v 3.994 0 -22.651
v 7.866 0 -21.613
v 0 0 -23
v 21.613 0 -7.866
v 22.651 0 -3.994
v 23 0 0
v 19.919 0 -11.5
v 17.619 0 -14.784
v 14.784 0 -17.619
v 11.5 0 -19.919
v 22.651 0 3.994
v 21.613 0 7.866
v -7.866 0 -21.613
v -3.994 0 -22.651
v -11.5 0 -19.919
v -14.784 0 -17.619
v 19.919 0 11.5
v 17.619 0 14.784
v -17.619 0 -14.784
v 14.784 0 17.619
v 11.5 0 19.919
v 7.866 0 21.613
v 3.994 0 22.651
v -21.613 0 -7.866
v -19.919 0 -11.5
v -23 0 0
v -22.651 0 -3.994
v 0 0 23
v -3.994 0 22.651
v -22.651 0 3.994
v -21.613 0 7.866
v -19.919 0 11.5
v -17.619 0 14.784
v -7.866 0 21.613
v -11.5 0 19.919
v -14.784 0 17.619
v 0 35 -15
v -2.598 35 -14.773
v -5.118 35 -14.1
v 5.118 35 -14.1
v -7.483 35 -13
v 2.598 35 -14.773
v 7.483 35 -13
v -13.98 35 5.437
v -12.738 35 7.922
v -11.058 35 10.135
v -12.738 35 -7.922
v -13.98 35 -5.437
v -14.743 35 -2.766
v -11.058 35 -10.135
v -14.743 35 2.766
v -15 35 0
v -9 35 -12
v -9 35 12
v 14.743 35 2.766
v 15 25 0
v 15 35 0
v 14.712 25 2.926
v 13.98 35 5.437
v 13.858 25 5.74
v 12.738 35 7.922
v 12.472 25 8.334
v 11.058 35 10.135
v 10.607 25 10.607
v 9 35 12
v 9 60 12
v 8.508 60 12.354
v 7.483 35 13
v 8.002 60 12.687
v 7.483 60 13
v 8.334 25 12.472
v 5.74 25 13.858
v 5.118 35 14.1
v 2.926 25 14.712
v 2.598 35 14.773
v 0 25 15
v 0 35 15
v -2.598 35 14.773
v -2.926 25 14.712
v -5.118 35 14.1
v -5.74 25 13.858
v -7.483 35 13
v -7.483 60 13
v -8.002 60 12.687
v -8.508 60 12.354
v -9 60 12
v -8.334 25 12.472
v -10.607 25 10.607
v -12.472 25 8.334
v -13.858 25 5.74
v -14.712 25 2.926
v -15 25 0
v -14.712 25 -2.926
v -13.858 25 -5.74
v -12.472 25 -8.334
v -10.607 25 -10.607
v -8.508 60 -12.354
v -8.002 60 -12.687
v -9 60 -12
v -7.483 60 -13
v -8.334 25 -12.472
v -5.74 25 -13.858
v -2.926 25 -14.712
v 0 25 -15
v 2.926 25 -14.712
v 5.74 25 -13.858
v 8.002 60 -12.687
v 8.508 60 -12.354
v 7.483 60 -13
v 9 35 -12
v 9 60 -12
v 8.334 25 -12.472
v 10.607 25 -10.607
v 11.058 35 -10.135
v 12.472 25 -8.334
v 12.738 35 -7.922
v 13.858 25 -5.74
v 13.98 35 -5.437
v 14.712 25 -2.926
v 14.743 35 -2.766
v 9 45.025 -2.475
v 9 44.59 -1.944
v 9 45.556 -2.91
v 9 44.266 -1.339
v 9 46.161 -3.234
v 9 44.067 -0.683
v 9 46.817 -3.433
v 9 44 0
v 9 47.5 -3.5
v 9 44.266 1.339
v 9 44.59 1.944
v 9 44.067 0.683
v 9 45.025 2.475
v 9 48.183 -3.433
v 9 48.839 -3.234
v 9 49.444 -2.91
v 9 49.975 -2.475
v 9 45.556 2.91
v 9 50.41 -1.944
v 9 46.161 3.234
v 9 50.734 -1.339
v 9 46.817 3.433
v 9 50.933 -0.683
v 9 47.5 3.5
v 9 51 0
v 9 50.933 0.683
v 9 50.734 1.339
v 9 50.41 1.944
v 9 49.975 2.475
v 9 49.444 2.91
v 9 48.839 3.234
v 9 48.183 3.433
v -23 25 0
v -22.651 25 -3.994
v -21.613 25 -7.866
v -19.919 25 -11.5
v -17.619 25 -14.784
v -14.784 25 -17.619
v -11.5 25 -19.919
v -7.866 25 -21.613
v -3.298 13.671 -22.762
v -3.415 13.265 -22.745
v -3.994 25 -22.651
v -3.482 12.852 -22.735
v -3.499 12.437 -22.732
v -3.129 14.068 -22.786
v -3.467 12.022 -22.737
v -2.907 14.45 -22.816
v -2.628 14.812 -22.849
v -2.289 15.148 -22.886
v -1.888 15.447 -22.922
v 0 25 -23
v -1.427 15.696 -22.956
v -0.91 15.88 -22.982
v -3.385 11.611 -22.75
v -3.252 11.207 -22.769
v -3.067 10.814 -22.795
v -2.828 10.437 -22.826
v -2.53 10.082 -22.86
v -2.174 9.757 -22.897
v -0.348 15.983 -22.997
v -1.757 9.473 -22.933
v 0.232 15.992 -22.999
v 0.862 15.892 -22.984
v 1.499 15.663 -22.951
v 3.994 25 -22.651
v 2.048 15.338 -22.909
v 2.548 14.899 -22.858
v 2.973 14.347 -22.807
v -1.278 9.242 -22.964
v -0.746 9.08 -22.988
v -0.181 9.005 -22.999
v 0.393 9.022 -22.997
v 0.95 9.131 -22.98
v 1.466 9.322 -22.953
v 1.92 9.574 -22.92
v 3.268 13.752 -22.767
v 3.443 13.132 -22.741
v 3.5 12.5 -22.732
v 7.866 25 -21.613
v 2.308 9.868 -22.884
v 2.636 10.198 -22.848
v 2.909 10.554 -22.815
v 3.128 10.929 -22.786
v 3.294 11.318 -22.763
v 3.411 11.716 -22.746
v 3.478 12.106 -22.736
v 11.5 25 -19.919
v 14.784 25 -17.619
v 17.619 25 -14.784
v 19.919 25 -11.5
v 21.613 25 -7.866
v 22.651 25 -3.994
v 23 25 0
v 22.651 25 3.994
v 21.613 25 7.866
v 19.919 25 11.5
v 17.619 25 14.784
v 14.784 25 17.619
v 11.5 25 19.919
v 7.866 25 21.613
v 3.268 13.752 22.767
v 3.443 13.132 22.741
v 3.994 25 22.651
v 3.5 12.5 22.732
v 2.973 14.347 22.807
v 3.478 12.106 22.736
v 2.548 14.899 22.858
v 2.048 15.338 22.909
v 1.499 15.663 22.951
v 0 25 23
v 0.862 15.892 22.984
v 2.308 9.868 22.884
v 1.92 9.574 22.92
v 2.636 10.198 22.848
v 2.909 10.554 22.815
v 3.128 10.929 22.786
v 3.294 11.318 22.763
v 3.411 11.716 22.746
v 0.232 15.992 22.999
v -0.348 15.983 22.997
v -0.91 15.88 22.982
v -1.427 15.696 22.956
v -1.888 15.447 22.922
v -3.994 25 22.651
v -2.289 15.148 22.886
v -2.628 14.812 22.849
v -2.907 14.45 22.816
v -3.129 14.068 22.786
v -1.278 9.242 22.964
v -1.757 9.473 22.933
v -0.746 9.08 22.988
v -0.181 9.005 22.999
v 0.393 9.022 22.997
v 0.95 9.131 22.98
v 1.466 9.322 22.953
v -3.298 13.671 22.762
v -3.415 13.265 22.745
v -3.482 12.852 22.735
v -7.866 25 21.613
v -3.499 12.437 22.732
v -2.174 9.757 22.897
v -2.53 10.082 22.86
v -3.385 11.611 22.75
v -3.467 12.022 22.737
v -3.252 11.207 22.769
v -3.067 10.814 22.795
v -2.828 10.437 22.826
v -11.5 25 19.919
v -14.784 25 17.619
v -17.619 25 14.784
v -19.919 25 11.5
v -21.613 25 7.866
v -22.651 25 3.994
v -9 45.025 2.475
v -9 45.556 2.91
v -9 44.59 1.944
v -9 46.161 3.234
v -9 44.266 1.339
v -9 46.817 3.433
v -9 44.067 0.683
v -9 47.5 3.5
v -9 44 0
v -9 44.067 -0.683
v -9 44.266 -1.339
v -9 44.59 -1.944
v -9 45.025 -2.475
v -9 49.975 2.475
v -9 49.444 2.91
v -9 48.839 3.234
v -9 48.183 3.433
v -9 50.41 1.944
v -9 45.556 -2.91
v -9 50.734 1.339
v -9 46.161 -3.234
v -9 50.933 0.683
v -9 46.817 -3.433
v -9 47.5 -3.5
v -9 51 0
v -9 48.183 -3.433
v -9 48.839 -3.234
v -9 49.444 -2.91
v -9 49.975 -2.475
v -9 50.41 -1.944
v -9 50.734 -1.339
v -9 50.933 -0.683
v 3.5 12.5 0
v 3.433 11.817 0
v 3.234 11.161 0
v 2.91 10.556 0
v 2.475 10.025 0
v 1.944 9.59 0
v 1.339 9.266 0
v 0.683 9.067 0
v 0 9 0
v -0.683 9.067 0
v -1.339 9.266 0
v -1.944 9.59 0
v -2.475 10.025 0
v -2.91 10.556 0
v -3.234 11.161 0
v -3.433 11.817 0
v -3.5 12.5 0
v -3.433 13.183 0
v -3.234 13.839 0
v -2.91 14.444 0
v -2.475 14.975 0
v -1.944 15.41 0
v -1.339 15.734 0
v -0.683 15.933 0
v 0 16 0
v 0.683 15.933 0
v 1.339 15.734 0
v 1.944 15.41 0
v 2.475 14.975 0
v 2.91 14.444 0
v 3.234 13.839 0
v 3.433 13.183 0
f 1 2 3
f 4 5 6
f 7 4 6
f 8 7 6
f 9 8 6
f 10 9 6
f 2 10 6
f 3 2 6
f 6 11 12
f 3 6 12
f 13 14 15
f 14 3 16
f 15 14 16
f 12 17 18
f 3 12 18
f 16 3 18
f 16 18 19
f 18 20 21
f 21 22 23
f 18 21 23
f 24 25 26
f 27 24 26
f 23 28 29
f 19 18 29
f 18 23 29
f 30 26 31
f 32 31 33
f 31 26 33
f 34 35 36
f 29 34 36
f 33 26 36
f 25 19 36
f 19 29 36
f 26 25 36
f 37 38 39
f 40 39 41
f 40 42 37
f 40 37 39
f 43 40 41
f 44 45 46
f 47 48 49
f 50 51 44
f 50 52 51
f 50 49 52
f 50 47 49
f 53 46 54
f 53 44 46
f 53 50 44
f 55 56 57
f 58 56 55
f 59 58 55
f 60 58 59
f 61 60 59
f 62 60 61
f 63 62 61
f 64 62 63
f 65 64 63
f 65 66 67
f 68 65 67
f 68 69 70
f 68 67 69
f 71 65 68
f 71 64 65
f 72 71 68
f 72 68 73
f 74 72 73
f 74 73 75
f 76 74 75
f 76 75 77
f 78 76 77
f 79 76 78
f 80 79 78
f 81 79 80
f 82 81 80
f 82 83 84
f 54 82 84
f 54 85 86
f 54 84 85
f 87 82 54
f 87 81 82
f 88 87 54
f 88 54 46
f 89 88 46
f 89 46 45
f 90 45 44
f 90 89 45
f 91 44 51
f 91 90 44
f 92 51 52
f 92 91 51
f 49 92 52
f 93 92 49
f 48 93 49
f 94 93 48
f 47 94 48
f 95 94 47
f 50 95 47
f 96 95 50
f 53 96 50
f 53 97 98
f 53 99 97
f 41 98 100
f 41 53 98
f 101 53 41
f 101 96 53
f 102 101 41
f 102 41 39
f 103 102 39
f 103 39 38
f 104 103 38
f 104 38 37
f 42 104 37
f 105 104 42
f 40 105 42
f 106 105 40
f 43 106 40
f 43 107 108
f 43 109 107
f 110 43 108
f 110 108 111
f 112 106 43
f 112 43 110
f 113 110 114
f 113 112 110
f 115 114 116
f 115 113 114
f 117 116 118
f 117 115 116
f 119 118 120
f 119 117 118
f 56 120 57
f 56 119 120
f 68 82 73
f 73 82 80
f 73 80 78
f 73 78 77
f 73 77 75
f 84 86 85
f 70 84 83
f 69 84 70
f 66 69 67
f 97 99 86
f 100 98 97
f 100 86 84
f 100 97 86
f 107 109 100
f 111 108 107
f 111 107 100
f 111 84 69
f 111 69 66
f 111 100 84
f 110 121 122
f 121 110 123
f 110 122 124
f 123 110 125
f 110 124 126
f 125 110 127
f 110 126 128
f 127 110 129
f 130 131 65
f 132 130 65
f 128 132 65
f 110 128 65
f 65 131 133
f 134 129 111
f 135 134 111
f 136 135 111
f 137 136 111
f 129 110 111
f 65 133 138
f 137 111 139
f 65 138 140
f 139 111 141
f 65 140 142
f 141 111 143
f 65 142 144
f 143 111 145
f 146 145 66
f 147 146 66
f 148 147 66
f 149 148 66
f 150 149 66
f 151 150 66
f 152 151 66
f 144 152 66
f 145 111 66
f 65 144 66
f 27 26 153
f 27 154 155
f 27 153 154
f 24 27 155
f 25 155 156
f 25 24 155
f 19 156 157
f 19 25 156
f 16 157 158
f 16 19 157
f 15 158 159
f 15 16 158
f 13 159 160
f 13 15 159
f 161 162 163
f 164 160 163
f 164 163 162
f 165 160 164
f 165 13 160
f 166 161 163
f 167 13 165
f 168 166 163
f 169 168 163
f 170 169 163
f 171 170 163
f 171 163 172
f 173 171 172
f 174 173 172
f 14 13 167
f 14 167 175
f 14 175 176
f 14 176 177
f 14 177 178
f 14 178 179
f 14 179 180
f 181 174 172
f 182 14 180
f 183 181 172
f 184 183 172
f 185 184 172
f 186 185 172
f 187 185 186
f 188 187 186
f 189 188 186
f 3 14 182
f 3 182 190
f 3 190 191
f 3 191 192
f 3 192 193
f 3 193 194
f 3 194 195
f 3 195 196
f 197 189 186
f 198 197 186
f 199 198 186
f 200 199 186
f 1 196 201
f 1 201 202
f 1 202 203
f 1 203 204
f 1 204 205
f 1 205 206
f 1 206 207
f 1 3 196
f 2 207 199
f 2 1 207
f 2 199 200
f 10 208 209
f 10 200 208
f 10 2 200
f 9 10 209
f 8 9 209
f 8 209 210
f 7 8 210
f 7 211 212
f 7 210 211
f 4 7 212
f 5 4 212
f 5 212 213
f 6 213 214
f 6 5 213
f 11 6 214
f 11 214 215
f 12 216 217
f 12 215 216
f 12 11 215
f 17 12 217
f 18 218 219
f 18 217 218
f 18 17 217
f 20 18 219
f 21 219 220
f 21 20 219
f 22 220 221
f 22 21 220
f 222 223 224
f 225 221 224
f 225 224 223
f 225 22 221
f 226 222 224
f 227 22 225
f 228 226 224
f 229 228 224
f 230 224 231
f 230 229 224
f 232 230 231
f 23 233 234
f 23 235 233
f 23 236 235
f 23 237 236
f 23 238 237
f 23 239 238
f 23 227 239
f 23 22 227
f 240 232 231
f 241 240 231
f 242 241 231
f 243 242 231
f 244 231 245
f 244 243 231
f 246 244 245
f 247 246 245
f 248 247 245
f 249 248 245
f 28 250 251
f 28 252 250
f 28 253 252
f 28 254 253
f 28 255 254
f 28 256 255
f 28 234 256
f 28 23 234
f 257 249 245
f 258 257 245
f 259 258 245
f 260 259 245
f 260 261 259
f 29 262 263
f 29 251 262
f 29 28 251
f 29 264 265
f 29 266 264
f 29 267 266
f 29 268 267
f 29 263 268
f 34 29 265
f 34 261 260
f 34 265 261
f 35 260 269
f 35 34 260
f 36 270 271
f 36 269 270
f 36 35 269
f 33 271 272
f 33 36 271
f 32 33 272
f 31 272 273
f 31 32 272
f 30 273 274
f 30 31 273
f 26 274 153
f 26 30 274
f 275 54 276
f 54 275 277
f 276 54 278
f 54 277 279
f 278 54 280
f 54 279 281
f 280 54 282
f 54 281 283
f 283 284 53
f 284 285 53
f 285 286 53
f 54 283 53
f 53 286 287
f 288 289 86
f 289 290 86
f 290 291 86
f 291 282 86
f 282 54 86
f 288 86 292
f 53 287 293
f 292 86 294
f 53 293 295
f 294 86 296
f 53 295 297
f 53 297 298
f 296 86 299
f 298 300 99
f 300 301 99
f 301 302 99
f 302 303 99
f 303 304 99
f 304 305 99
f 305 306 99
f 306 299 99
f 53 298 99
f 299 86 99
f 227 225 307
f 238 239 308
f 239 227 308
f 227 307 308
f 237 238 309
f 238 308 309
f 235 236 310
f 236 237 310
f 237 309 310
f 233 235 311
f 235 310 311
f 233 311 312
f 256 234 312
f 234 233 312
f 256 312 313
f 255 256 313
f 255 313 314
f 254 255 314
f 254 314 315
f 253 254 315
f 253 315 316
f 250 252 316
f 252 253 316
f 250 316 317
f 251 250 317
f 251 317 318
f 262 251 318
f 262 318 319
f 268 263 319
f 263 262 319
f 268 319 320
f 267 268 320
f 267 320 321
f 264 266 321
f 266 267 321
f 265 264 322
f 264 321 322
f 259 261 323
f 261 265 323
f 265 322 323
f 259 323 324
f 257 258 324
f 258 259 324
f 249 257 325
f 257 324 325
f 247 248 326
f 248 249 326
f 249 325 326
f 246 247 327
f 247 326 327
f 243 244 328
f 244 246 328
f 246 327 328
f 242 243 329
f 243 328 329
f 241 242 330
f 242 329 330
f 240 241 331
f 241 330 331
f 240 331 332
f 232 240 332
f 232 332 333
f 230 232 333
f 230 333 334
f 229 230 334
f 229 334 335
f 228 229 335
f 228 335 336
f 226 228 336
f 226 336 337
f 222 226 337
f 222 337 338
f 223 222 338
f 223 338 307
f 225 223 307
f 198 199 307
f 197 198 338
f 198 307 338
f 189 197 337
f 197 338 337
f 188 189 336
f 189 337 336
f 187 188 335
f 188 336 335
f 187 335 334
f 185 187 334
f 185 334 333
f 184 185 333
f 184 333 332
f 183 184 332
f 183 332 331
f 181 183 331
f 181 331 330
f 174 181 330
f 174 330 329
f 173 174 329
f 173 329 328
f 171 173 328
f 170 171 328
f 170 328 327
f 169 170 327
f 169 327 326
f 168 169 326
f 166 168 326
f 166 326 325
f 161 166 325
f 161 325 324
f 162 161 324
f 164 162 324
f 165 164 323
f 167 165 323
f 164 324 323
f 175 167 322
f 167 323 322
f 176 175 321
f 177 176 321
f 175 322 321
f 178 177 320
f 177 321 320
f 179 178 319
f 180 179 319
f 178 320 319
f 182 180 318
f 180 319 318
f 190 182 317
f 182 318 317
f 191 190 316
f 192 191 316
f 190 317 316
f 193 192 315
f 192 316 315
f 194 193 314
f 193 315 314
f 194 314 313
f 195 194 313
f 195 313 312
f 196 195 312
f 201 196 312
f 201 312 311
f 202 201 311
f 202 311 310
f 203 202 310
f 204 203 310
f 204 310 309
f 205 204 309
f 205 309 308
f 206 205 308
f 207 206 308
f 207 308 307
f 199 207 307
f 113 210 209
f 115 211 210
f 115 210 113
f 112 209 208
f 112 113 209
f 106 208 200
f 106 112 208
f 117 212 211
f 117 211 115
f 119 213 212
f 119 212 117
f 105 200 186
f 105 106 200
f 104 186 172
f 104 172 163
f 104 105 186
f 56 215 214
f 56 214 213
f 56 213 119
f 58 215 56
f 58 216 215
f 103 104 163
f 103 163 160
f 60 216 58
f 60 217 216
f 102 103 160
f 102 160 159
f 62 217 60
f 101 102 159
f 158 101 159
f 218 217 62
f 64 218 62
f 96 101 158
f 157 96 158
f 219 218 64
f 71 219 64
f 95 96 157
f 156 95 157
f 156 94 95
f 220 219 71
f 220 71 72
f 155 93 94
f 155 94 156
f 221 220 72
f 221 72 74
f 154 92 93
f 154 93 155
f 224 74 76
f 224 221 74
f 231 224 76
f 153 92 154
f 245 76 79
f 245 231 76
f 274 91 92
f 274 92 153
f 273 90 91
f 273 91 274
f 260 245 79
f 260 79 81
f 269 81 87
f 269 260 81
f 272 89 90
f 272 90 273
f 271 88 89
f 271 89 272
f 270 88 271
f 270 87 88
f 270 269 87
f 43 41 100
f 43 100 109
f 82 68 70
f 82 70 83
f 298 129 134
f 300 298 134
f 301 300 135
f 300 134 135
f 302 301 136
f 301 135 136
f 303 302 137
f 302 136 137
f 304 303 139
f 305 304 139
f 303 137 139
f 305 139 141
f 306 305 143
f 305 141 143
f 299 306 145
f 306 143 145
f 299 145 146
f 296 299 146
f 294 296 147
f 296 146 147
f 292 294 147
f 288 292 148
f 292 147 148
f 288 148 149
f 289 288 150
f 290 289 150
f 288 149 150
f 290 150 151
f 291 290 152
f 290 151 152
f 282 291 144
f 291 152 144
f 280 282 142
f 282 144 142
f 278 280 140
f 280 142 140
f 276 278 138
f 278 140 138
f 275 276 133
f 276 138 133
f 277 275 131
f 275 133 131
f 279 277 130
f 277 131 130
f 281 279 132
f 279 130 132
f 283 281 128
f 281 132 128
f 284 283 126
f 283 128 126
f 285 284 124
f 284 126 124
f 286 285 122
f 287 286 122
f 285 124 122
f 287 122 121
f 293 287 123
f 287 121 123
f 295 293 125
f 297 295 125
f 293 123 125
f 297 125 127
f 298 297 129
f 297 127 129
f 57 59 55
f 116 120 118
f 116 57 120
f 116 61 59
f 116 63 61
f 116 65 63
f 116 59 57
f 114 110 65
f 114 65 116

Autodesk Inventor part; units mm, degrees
ref_plane "YZ Plane" through (0, 0, 0) normal (1, 0, 0) x (0, 1, 0)
ref_plane "XZ Plane" through (0, 0, 0) normal (0, 1, 0) x (-1, 0, 0)
ref_plane "XY Plane" through (0, 0, 0) normal (0, 0, 1) x (1, 0, 0)
sketch "Эскиз1" plane through (0, 0, 0) normal (0, 1, 0) x (-1, 0, 0)
  circle A0 centre (0, 0) radius 23
  dimension "d0" = 46
extrude "Выдавливание1" add sketch "Эскиз1" along normal blind 25
sketch "Эскиз2" plane through (0, 25, 0) normal (0, 1, 0) x (1, 0, 0)
  circle A0 centre (0, 0) radius 15
  dimension "d3" = 30
extrude "Выдавливание2" add sketch "Эскиз2" along normal blind 35
sketch "Эскиз3" plane through (0, 60, 0) normal (0, 1, 0) x (1, 0, 0)
  line L0 (9, -13) -> (-9, -13)
  line L1 (-9, -13) -> (-9, 13)
  line L2 (-9, 13) -> (9, 13)
  line L3 (9, 13) -> (9, -13)
  line L4 (9, -13) -> (-9, 13) construction
  line L5 (-9, -13) -> (9, 13) construction
  circle A0 centre (0, 0) radius 23 projected
  dimension "d6" = 26
  dimension "d7" = 18
extrude "Выдавливание3" cut sketch "Эскиз3" against normal blind 25
sketch "Эскиз4" plane through (9, 60, 12) normal (1, 0, 0) x (0, 0, -1)
  circle A0 centre (12, -12.5) radius 3.5
  line L0 (0, -25) -> (24, -25) projected
  point P0 (12, -60)
  dimension "d10" = 7
  dimension "d11" = 12.5
extrude "Выдавливание4" cut sketch "Эскиз4" along normal through all both and the other way through all
sketch "Эскиз5" plane through (0, 0, 0) normal (0, 0, 1) x (1, 0, 0)
  circle A0 centre (0, 12.5) radius 3.5
  point P0 (0, 0)
  dimension "d14" = 7
  dimension "d15" = 12.5
extrude "Выдавливание5" cut sketch "Эскиз5" along normal through all both and the other way through all
properties part number "ДЗ2-1"
